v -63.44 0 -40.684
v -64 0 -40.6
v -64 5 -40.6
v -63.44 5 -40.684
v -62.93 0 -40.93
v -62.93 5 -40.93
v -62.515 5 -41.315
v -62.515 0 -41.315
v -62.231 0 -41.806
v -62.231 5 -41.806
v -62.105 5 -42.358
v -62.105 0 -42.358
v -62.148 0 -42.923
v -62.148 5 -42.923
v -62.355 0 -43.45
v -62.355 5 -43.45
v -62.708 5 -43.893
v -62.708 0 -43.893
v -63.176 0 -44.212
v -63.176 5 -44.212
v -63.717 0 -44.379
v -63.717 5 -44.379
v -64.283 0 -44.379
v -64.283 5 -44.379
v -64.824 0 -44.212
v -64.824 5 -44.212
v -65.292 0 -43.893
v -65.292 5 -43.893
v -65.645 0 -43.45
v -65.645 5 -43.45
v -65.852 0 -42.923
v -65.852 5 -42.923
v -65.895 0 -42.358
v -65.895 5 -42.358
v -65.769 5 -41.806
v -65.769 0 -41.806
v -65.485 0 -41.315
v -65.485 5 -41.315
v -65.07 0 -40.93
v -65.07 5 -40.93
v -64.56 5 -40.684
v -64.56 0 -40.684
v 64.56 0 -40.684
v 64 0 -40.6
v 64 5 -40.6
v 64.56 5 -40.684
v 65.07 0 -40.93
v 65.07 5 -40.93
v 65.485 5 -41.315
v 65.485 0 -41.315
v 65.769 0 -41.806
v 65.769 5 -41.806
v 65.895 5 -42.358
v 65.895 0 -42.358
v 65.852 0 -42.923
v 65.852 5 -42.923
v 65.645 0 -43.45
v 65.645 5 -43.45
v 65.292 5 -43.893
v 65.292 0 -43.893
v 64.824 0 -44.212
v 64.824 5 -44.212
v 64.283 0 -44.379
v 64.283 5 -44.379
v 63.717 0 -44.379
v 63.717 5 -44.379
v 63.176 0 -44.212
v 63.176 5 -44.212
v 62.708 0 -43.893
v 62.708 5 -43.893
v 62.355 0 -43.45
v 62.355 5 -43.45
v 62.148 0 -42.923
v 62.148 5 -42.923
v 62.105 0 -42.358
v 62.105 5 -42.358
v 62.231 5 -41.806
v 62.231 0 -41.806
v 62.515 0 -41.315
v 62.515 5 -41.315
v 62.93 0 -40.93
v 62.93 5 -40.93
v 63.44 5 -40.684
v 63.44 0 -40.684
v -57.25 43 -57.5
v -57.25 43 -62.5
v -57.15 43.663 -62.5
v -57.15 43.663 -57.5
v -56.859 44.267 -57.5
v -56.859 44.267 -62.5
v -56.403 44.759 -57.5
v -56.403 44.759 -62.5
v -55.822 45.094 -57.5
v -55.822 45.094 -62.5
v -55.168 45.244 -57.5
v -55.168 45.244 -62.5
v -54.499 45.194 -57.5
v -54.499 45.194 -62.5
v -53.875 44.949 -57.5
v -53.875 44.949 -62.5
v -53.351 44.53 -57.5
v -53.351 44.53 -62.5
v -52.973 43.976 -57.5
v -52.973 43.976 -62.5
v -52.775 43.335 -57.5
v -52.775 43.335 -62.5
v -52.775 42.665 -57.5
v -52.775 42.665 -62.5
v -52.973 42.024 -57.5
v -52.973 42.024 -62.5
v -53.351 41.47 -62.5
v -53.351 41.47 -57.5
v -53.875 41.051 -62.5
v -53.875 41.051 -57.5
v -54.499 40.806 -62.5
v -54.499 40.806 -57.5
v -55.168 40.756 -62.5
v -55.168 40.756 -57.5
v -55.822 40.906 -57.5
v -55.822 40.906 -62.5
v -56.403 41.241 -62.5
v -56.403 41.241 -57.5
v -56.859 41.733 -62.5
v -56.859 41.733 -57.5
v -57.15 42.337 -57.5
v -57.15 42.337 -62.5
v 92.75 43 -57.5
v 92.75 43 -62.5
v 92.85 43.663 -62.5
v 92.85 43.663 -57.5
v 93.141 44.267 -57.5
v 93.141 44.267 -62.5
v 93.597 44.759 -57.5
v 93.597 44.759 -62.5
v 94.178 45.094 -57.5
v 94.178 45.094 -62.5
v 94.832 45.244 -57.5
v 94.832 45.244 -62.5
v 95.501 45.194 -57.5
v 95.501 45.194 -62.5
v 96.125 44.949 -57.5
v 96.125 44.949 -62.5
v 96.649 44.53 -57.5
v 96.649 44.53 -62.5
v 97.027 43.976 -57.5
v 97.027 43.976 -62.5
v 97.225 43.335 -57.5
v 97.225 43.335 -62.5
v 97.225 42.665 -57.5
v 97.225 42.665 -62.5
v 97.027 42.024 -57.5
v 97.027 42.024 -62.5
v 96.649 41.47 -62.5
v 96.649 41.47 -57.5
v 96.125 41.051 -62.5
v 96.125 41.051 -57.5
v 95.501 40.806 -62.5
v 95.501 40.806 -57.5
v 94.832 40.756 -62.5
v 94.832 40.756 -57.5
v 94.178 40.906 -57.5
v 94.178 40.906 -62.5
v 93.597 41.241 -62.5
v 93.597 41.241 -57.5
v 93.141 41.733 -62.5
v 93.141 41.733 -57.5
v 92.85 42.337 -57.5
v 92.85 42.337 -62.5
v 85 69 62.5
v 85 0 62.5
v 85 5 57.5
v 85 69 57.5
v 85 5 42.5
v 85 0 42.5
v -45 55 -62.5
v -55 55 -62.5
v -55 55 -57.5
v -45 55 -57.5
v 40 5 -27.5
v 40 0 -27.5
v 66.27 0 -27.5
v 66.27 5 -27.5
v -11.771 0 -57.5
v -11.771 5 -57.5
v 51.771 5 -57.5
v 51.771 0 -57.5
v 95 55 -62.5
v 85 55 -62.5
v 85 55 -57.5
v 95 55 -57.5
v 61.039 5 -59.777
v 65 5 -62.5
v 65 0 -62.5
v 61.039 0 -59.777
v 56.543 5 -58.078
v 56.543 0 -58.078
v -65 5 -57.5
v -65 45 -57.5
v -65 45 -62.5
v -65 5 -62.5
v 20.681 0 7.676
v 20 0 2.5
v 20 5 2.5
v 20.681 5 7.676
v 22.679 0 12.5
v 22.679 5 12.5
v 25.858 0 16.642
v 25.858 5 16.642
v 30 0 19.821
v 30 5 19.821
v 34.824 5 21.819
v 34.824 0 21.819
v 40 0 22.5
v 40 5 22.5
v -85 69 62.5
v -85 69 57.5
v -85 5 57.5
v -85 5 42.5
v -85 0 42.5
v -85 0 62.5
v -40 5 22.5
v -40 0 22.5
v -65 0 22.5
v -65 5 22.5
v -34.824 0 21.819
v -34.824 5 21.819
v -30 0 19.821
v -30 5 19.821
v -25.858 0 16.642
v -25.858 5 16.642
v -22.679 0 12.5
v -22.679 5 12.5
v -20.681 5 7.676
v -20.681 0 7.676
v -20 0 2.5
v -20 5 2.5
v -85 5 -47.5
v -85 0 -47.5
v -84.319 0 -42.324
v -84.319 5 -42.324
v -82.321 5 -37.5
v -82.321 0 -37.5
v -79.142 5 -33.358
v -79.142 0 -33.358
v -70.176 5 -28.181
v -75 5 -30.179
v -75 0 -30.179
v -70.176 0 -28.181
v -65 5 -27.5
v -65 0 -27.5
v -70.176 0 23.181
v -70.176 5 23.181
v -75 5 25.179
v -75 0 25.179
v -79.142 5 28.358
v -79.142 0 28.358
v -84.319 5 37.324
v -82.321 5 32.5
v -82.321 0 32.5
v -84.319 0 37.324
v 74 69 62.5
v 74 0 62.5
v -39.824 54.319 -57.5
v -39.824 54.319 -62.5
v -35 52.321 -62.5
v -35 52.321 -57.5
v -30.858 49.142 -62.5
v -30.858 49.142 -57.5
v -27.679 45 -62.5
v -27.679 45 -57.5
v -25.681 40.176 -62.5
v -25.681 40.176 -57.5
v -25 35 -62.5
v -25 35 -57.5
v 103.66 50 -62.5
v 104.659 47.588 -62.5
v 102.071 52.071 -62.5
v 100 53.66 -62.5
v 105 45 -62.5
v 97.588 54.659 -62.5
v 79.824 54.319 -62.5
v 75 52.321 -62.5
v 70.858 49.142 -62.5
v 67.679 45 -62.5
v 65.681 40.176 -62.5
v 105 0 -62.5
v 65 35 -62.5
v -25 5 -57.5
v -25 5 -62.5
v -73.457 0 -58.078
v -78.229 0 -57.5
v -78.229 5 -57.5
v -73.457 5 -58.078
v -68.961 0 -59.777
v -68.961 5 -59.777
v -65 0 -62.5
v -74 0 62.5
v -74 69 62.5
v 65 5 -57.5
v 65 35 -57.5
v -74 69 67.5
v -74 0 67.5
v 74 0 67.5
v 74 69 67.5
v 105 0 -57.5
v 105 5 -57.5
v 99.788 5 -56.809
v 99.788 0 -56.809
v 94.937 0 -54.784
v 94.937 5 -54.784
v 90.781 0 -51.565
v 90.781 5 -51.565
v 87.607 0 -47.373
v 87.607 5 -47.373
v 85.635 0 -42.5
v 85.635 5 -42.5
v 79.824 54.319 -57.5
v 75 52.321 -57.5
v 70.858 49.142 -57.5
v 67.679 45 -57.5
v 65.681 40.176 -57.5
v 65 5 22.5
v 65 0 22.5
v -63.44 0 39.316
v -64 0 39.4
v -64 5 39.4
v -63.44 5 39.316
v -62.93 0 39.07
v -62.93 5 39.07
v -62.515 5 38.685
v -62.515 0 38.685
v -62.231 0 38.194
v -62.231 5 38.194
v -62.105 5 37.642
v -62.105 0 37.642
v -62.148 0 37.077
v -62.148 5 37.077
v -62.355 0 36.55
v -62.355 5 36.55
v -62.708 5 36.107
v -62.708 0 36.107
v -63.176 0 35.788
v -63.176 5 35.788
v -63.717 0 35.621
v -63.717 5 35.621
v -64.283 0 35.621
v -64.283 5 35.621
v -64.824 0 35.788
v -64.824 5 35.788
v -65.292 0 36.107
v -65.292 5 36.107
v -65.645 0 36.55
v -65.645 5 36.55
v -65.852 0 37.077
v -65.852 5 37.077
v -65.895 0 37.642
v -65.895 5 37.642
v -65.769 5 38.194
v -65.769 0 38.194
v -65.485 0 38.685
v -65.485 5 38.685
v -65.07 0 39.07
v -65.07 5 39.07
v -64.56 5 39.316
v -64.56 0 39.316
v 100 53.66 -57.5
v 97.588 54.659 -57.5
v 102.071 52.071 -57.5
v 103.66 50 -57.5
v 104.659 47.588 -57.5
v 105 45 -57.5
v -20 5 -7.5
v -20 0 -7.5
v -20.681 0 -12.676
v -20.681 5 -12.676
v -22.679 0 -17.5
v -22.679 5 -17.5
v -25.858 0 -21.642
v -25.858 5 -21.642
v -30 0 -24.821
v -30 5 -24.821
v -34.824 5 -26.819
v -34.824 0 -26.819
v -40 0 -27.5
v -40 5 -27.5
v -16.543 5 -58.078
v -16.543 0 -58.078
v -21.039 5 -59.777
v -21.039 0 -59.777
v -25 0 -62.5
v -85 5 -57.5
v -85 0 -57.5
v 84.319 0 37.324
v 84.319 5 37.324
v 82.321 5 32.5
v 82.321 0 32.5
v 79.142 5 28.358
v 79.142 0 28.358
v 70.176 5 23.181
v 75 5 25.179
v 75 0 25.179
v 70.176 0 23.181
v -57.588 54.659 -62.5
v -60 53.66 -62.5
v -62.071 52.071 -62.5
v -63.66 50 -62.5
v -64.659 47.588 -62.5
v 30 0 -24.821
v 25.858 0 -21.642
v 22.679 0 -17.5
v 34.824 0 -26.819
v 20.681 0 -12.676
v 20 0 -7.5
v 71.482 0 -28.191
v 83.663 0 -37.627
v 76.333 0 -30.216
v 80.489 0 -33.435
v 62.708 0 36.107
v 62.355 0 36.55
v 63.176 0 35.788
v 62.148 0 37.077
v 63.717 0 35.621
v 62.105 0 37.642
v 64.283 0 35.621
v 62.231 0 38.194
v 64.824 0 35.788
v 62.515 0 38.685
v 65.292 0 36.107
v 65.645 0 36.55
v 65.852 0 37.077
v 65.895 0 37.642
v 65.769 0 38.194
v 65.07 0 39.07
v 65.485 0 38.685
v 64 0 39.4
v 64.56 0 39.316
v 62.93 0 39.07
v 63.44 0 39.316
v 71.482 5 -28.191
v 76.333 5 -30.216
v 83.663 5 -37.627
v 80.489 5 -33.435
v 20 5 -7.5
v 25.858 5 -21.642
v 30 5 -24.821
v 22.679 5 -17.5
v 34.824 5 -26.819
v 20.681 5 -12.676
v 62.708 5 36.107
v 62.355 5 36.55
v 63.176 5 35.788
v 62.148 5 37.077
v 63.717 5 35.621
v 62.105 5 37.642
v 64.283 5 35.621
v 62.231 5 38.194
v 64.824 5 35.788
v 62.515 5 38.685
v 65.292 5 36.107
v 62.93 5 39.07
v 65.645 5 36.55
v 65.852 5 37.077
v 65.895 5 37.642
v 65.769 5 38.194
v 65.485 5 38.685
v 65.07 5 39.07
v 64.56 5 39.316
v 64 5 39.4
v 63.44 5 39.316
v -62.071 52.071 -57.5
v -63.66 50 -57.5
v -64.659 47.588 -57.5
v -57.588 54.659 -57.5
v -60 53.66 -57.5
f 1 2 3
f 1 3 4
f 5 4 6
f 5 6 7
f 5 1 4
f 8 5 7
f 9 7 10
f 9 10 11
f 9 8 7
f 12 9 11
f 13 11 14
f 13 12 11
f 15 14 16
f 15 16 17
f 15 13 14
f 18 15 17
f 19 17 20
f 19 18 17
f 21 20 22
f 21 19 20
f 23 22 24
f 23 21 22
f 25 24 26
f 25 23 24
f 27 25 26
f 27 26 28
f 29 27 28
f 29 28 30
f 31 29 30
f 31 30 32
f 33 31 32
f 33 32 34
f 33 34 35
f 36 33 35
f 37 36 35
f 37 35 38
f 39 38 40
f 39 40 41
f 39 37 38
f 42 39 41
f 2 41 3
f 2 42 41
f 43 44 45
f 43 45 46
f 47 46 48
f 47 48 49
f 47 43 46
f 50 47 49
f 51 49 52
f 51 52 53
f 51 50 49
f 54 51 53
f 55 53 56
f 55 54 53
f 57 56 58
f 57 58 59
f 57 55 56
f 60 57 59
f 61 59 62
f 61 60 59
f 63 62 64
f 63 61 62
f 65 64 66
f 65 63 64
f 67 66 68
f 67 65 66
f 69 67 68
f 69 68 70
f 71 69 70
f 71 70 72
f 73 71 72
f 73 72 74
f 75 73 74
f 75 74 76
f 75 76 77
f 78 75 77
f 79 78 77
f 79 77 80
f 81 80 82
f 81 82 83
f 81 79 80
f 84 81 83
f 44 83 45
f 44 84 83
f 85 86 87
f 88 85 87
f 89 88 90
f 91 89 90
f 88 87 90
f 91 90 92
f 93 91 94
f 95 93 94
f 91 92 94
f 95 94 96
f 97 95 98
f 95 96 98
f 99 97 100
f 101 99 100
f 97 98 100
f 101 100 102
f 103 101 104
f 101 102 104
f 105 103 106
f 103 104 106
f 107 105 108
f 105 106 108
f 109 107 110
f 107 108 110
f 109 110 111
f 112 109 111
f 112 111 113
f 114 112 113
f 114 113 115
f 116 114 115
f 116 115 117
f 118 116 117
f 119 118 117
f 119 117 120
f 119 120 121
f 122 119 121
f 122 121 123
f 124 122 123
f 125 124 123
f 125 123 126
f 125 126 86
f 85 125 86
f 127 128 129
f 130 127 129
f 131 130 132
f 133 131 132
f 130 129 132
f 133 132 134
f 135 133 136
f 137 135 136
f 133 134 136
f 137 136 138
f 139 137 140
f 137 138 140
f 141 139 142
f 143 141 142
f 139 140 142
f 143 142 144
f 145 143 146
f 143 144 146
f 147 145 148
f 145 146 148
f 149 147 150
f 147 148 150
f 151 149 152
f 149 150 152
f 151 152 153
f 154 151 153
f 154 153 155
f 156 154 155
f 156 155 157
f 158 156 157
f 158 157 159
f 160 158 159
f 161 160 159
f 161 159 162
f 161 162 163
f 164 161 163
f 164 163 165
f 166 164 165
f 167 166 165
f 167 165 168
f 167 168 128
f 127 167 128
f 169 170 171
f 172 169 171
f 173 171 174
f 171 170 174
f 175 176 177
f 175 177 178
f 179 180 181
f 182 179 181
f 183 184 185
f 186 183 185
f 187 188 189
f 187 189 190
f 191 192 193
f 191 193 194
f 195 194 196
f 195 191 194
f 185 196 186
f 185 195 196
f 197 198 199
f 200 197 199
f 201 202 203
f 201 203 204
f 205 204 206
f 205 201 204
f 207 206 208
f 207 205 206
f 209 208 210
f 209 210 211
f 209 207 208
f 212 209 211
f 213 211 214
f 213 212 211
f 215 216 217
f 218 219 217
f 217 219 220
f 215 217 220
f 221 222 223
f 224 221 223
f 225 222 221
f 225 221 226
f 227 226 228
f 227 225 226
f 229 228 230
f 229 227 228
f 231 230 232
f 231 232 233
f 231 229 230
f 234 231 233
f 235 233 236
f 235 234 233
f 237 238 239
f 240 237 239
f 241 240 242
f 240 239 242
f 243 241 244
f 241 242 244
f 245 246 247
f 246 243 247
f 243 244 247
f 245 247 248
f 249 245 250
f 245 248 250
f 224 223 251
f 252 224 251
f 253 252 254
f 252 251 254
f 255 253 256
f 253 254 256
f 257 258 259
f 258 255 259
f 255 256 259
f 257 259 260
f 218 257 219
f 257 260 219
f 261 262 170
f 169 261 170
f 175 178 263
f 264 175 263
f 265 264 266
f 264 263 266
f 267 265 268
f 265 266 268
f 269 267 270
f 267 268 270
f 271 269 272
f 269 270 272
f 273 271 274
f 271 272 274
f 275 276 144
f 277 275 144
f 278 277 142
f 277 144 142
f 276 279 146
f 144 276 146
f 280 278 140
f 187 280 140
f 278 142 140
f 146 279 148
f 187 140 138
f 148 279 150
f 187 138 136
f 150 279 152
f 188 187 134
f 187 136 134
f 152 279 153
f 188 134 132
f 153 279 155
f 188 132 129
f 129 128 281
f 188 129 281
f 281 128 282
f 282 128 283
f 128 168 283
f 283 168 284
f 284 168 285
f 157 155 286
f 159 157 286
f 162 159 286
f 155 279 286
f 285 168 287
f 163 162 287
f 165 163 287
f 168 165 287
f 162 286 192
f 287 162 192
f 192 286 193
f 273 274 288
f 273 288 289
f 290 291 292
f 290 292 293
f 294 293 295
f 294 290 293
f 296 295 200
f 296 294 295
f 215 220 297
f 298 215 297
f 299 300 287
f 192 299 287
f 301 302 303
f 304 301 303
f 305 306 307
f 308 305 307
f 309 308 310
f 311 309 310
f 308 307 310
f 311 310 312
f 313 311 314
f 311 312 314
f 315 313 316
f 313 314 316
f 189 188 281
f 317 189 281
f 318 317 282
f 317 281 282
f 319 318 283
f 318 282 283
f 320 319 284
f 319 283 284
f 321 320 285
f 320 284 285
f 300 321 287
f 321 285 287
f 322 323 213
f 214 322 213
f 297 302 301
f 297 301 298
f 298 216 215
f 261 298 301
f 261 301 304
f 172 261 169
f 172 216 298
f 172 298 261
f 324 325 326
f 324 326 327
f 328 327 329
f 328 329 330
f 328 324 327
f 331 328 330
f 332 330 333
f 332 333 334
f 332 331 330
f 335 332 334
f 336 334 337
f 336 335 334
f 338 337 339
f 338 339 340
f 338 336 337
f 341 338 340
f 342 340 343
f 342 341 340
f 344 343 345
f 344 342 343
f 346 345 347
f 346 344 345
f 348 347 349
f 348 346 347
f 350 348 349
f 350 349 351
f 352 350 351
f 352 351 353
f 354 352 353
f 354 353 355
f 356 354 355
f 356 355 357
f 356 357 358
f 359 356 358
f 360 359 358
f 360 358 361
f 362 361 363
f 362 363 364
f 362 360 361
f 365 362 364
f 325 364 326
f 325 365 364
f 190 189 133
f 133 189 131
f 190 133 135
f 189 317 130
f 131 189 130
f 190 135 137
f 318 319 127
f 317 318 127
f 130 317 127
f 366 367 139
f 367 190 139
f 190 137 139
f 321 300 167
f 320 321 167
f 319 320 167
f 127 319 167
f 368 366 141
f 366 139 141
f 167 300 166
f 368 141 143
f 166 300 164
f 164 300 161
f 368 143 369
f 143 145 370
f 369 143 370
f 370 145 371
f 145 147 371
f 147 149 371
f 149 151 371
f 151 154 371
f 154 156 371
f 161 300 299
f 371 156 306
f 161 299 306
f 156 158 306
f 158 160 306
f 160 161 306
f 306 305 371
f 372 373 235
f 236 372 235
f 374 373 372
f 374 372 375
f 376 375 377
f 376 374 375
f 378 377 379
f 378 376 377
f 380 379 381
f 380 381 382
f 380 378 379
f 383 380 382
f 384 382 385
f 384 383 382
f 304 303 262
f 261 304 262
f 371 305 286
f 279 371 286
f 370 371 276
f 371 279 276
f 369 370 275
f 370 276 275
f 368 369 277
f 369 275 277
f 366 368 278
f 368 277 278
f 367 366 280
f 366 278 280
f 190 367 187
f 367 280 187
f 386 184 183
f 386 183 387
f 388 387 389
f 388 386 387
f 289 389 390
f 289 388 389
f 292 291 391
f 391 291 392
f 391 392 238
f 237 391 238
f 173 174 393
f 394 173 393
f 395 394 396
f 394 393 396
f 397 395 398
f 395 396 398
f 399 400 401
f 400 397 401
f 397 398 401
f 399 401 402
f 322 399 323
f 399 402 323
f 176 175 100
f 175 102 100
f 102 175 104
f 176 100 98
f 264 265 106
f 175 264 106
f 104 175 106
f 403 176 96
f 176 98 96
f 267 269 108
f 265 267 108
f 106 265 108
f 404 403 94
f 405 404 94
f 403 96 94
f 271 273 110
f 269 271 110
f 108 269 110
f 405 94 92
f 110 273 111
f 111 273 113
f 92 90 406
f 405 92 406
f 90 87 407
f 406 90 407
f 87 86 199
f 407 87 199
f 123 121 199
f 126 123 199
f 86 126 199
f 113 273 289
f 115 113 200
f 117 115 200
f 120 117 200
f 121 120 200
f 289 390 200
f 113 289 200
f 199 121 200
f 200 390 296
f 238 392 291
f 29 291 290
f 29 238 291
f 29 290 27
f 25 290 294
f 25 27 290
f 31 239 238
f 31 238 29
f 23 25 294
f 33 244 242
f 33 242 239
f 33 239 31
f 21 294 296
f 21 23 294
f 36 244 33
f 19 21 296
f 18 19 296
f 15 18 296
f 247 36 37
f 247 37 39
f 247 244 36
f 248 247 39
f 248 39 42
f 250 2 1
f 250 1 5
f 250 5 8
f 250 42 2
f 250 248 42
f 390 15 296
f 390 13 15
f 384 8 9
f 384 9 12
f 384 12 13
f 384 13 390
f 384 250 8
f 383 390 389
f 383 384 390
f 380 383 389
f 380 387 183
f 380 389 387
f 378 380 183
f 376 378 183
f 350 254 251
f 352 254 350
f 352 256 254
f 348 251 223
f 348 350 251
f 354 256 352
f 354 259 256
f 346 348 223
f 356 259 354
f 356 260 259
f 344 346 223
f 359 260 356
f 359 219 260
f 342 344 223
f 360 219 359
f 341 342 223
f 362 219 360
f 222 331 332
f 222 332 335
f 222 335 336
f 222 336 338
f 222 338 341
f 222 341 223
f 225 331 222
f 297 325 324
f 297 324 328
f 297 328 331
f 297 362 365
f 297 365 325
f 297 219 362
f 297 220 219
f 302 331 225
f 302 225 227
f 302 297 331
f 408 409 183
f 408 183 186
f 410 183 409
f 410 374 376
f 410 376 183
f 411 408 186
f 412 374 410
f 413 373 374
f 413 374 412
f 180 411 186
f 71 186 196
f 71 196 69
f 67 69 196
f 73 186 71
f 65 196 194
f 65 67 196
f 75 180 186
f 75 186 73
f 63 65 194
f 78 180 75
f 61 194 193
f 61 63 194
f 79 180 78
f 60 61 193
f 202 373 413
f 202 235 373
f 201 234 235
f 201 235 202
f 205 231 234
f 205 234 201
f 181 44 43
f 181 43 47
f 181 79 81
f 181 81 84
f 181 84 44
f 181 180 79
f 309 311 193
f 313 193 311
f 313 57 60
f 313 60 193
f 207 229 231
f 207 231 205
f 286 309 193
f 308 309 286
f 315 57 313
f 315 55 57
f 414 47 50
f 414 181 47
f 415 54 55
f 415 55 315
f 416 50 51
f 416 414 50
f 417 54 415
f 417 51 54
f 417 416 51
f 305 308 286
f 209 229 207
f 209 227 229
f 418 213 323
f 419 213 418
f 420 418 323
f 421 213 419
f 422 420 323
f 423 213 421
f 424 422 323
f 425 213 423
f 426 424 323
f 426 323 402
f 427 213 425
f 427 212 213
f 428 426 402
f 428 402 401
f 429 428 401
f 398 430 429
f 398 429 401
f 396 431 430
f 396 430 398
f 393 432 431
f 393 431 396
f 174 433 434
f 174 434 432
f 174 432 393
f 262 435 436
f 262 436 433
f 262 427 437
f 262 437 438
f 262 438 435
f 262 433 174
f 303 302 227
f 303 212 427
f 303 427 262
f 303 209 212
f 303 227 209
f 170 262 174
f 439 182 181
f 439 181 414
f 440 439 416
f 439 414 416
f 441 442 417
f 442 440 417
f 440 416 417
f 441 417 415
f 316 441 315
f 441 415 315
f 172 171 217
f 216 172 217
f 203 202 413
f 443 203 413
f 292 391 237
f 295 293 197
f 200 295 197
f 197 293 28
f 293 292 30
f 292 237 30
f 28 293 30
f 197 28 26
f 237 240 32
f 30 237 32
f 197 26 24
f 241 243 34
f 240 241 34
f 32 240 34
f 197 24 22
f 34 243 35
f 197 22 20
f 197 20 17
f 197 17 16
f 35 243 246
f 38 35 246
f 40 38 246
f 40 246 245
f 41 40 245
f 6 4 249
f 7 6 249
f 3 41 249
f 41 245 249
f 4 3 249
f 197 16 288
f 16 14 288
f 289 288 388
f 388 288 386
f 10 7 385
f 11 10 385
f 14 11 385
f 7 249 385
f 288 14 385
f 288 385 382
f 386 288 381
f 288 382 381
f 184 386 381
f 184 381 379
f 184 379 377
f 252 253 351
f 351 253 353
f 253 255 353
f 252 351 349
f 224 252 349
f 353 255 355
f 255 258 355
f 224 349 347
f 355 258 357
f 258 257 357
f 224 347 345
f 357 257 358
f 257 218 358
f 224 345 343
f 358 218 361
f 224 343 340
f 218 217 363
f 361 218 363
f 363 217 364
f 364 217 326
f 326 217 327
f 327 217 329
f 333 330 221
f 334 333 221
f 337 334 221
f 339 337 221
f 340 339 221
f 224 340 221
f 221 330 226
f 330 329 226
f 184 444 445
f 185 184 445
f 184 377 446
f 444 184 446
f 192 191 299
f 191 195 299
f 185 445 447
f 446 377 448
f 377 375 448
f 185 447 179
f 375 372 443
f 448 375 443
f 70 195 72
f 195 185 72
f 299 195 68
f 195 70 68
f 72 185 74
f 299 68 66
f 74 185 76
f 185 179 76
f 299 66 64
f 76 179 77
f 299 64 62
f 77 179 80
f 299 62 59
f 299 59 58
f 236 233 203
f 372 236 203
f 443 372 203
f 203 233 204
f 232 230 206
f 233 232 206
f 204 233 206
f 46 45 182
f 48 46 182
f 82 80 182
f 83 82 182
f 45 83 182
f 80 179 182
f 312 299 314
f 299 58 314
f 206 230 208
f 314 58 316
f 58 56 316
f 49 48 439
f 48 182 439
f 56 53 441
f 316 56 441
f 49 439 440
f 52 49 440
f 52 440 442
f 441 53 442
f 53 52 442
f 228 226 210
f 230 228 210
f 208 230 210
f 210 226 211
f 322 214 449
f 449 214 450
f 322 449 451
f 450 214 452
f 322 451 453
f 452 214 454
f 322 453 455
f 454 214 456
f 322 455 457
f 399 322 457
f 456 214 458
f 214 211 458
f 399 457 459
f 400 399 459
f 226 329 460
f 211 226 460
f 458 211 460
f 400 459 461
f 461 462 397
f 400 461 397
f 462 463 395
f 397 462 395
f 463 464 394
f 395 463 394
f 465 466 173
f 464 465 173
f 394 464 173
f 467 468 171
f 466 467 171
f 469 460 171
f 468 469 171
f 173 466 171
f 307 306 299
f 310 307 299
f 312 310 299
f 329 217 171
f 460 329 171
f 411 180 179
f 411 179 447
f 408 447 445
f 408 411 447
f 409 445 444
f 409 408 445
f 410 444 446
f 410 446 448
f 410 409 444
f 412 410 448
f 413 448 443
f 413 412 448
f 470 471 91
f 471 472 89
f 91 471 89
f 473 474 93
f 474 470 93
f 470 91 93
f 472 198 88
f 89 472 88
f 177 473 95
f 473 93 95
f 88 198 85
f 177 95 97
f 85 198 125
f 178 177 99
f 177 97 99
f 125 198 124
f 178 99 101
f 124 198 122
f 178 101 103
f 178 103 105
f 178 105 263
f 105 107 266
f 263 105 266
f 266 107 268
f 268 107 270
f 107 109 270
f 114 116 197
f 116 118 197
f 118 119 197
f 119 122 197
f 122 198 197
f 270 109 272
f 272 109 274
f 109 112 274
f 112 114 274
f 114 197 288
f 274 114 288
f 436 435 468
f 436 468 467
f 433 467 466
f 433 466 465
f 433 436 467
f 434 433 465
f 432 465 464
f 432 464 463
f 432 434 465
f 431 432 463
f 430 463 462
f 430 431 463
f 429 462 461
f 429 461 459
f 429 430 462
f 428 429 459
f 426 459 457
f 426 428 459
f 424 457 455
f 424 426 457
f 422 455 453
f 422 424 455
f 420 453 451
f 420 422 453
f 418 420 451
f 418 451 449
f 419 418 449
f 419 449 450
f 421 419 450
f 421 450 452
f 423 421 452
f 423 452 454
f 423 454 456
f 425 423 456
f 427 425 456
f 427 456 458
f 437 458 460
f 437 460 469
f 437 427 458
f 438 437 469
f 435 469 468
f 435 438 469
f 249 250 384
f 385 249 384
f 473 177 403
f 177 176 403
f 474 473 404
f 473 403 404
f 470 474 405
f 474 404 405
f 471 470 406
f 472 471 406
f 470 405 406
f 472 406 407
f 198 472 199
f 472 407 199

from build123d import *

# Parameters (mm, degrees)
SKETCH1_R           = 1.9
BOSS_EXTRUDE1_DEPTH = 5
SKETCH1_4_W         = 148
SKETCH1_4_H         = 5
BOSS_EXTRUDE3_DEPTH = 69
SKETCH1_5_W         = 150
SKETCH1_5_H         = 5
SKETCH1_5_W_2       = 20
BOSS_EXTRUDE4_DEPTH = 55
SKETCH2_R           = 2.25
CUT_EXTRUDE1_DEPTH  = 60
FILLET1_R           = 20
FILLET2_R           = 10
SKETCH4_W           = 90
SKETCH4_H           = 5
CUT_EXTRUDE2_DEPTH  = 55
FILLET3_R           = 20


# Some blends are built 0.0001 mm under size
with BuildPart() as part:
    # Sketch1 → Boss-Extrude1 (new body)
    with BuildSketch(Plane(origin=(0, 0, 0), x_dir=(1, 0, 0), z_dir=(0, 1, 0))):
        Polygon((-85, -22.5), (-85, -57.5), (85, -57.5), (85, -22.5), (20, -22.5), (20, 27.5), (85, 27.5), (85, 57.5), (-65, 57.5), (-85, 57.5), (-85, 27.5), (-20, 27.5), (-20, -22.5), align=None)
        with Locations(Location((-64, -37.5, 0), (0, 0, 270))):
            Circle(SKETCH1_R, mode=Mode.SUBTRACT)
        with Locations(Location((64, -37.5, 0), (0, 0, 270))):
            Circle(SKETCH1_R, mode=Mode.SUBTRACT)
        with Locations(Location((-64, 42.5, 0), (0, 0, 270))):
            Circle(SKETCH1_R, mode=Mode.SUBTRACT)
        with Locations(Location((64, 42.5, 0), (0, 0, 270))):
            Circle(SKETCH1_R, mode=Mode.SUBTRACT)
    extrude(amount=BOSS_EXTRUDE1_DEPTH)

    # Sketch1<4> → Boss-Extrude3 (add)
    with BuildSketch(Plane(origin=(0, 0, 0), x_dir=(1, 0, 0), z_dir=(0, 1, 0))):
        with Locations((0, -65)):
            Rectangle(SKETCH1_4_W, SKETCH1_4_H)
        Polygon((85, -57.5), (-85, -57.5), (-85, -62.5), (-74, -62.5), (74, -62.5), (85, -62.5), align=None)
    extrude(amount=BOSS_EXTRUDE3_DEPTH)

    # Sketch1<5> → Boss-Extrude4 (add)
    with BuildSketch(Plane(origin=(0, 0, 0), x_dir=(1, 0, 0), z_dir=(0, 1, 0))):
        with Locations((10, 60)):
            Rectangle(SKETCH1_5_W, SKETCH1_5_H)
        with Locations((95, 60)):
            Rectangle(SKETCH1_5_W_2, SKETCH1_5_H)
    extrude(amount=BOSS_EXTRUDE4_DEPTH)

    # Sketch2 → Cut-Extrude1 (cut)
    with BuildSketch(Plane(origin=(0, 0, -62.5), x_dir=(-1, 0, 0), z_dir=(0, 0, -1))):
        with Locations((-95, 43)):
            Circle(SKETCH2_R)
        with Locations((55, 43)):
            Circle(SKETCH2_R)
    extrude(amount=-CUT_EXTRUDE1_DEPTH, mode=Mode.SUBTRACT)

    # Fillet1
    fillet1_edges = [part.edges().sort_by_distance(p)[0] for p in [
        (85, 2.5, -57.5),
    ]]
    fillet(fillet1_edges, radius=FILLET1_R - 0.0001)  # a hair under: the kernel refuses the full size

    # Fillet2
    fillet2_edges = [part.edges().sort_by_distance(p)[0] for p in [
        (-65, 55, -60),
        (105, 55, -60),
    ]]
    fillet(fillet2_edges, radius=FILLET2_R)

    # Sketch4 → Cut-Extrude2 (cut)
    with BuildSketch(Plane(origin=(0, 55, 0), x_dir=(1, 0, 0), z_dir=(0, 1, 0))):
        with Locations((20, 60)):
            Rectangle(SKETCH4_W, SKETCH4_H)
    extrude(amount=-CUT_EXTRUDE2_DEPTH, mode=Mode.SUBTRACT)

    # Fillet3
    # the kernel refuses this fillet: 20 mm, written as the material it adds along each edge
    with BuildSketch(Plane(origin=(65, 5, -57.5), x_dir=(-1, 0, 0), z_dir=(0, -1, 0))) as fillet3_piece_1:
        with BuildLine():
            CenterArc((13.228756555, 20), FILLET3_R, 228.590377891, 41.409622109)
            Line((0, 5), (0, 0))
            Line((0, 0), (13.228756555, 0))
        make_face()
    extrude(amount=5)
    with BuildSketch(Plane(origin=(-25, 5, -57.5), x_dir=(0, 0, -1), z_dir=(0, -1, 0)), Plane(origin=(-65, 0, -57.5), x_dir=(0, 0, -1), z_dir=(0, 1, 0))) as fillet3_piece_2:
        with BuildLine():
            CenterArc((20, 13.228756555), FILLET3_R, 180, 41.409622109)
            Line((0, 13.228756555), (0, 0))
            Line((0, 0), (5, 0))
        make_face()
    extrude(amount=5)
    with BuildSketch(Plane(origin=(-20, 0, 22.5), x_dir=(-1, 0, 0), z_dir=(0, 1, 0)), Plane(origin=(-20, 0, -27.5), x_dir=(0, 0, 1), z_dir=(0, 1, 0)), Plane(origin=(20, 0, 22.5), x_dir=(0, 0, -1), z_dir=(0, 1, 0)), Plane(origin=(20, 0, -27.5), x_dir=(1, 0, 0), z_dir=(0, 1, 0))) as fillet3_piece_3:
        with BuildLine():
            CenterArc((FILLET3_R, -FILLET3_R), FILLET3_R, 90, 90)
            Line((0, -FILLET3_R), (0, 0))
            Line((0, 0), (FILLET3_R, 0))
        make_face()
    extrude(amount=5)
    # the kernel refuses this fillet: 20 mm, written as the material it takes off along each edge
    with BuildSketch(Plane(origin=(-25, 55, -7.5), x_dir=(0, -1, 0), z_dir=(0, 0, -1)), Plane(origin=(65, 55, -112.5), x_dir=(0, -1, 0), z_dir=(0, 0, 1))) as fillet3_2_piece_1:
        with BuildLine():
            CenterArc((FILLET3_R, FILLET3_R), FILLET3_R, 180, 90)
            Line((0, FILLET3_R), (0, 0))
            Line((0, 0), (FILLET3_R, 0))
        make_face()
    extrude(amount=105, mode=Mode.SUBTRACT)
    with BuildSketch(Plane(origin=(85, -46.824640006, -27.5), x_dir=(0.04230002714791386, 0, -0.999104953297343), z_dir=(0, 1, 0))) as fillet3_2_piece_2:
        with BuildLine():
            CenterArc((19.189825649, 19.559092449), FILLET3_R, 182.42433637, 75.522598767)
            Line((-0.792273417, 18.713091906), (-2.790483324, 18.628491852))
            Line((-2.790483324, 18.628491852), (-1.998209907, -0.084600054))
            Line((-1.998209907, -0.084600054), (0.084600054, -1.998209907))
            ThreePointArc((0.084600054, -1.998209907), (10.075749498, -1.575205405), (14.595840223, -1.955909245))
            Line((14.595840223, -1.955909245), (15.013475262, 0))
        make_face()
    extrude(amount=98.649280012, mode=Mode.SUBTRACT)
    with BuildSketch(Plane(origin=(-85, -50, -27.5), x_dir=(0, 0, -1), z_dir=(0, 1, 0)), Plane(origin=(-85, -50, 22.5), x_dir=(1, 0, 0), z_dir=(0, 1, 0)), Plane(origin=(85, -50, 22.5), x_dir=(0, 0, 1), z_dir=(0, 1, 0))) as fillet3_2_piece_3:
        with BuildLine():
            CenterArc((FILLET3_R, -FILLET3_R), FILLET3_R, 90, 90)
            Line((0, -FILLET3_R), (0, 0))
            Line((0, 0), (FILLET3_R, 0))
        make_face()
    extrude(amount=105, mode=Mode.SUBTRACT)


solid = part.part
